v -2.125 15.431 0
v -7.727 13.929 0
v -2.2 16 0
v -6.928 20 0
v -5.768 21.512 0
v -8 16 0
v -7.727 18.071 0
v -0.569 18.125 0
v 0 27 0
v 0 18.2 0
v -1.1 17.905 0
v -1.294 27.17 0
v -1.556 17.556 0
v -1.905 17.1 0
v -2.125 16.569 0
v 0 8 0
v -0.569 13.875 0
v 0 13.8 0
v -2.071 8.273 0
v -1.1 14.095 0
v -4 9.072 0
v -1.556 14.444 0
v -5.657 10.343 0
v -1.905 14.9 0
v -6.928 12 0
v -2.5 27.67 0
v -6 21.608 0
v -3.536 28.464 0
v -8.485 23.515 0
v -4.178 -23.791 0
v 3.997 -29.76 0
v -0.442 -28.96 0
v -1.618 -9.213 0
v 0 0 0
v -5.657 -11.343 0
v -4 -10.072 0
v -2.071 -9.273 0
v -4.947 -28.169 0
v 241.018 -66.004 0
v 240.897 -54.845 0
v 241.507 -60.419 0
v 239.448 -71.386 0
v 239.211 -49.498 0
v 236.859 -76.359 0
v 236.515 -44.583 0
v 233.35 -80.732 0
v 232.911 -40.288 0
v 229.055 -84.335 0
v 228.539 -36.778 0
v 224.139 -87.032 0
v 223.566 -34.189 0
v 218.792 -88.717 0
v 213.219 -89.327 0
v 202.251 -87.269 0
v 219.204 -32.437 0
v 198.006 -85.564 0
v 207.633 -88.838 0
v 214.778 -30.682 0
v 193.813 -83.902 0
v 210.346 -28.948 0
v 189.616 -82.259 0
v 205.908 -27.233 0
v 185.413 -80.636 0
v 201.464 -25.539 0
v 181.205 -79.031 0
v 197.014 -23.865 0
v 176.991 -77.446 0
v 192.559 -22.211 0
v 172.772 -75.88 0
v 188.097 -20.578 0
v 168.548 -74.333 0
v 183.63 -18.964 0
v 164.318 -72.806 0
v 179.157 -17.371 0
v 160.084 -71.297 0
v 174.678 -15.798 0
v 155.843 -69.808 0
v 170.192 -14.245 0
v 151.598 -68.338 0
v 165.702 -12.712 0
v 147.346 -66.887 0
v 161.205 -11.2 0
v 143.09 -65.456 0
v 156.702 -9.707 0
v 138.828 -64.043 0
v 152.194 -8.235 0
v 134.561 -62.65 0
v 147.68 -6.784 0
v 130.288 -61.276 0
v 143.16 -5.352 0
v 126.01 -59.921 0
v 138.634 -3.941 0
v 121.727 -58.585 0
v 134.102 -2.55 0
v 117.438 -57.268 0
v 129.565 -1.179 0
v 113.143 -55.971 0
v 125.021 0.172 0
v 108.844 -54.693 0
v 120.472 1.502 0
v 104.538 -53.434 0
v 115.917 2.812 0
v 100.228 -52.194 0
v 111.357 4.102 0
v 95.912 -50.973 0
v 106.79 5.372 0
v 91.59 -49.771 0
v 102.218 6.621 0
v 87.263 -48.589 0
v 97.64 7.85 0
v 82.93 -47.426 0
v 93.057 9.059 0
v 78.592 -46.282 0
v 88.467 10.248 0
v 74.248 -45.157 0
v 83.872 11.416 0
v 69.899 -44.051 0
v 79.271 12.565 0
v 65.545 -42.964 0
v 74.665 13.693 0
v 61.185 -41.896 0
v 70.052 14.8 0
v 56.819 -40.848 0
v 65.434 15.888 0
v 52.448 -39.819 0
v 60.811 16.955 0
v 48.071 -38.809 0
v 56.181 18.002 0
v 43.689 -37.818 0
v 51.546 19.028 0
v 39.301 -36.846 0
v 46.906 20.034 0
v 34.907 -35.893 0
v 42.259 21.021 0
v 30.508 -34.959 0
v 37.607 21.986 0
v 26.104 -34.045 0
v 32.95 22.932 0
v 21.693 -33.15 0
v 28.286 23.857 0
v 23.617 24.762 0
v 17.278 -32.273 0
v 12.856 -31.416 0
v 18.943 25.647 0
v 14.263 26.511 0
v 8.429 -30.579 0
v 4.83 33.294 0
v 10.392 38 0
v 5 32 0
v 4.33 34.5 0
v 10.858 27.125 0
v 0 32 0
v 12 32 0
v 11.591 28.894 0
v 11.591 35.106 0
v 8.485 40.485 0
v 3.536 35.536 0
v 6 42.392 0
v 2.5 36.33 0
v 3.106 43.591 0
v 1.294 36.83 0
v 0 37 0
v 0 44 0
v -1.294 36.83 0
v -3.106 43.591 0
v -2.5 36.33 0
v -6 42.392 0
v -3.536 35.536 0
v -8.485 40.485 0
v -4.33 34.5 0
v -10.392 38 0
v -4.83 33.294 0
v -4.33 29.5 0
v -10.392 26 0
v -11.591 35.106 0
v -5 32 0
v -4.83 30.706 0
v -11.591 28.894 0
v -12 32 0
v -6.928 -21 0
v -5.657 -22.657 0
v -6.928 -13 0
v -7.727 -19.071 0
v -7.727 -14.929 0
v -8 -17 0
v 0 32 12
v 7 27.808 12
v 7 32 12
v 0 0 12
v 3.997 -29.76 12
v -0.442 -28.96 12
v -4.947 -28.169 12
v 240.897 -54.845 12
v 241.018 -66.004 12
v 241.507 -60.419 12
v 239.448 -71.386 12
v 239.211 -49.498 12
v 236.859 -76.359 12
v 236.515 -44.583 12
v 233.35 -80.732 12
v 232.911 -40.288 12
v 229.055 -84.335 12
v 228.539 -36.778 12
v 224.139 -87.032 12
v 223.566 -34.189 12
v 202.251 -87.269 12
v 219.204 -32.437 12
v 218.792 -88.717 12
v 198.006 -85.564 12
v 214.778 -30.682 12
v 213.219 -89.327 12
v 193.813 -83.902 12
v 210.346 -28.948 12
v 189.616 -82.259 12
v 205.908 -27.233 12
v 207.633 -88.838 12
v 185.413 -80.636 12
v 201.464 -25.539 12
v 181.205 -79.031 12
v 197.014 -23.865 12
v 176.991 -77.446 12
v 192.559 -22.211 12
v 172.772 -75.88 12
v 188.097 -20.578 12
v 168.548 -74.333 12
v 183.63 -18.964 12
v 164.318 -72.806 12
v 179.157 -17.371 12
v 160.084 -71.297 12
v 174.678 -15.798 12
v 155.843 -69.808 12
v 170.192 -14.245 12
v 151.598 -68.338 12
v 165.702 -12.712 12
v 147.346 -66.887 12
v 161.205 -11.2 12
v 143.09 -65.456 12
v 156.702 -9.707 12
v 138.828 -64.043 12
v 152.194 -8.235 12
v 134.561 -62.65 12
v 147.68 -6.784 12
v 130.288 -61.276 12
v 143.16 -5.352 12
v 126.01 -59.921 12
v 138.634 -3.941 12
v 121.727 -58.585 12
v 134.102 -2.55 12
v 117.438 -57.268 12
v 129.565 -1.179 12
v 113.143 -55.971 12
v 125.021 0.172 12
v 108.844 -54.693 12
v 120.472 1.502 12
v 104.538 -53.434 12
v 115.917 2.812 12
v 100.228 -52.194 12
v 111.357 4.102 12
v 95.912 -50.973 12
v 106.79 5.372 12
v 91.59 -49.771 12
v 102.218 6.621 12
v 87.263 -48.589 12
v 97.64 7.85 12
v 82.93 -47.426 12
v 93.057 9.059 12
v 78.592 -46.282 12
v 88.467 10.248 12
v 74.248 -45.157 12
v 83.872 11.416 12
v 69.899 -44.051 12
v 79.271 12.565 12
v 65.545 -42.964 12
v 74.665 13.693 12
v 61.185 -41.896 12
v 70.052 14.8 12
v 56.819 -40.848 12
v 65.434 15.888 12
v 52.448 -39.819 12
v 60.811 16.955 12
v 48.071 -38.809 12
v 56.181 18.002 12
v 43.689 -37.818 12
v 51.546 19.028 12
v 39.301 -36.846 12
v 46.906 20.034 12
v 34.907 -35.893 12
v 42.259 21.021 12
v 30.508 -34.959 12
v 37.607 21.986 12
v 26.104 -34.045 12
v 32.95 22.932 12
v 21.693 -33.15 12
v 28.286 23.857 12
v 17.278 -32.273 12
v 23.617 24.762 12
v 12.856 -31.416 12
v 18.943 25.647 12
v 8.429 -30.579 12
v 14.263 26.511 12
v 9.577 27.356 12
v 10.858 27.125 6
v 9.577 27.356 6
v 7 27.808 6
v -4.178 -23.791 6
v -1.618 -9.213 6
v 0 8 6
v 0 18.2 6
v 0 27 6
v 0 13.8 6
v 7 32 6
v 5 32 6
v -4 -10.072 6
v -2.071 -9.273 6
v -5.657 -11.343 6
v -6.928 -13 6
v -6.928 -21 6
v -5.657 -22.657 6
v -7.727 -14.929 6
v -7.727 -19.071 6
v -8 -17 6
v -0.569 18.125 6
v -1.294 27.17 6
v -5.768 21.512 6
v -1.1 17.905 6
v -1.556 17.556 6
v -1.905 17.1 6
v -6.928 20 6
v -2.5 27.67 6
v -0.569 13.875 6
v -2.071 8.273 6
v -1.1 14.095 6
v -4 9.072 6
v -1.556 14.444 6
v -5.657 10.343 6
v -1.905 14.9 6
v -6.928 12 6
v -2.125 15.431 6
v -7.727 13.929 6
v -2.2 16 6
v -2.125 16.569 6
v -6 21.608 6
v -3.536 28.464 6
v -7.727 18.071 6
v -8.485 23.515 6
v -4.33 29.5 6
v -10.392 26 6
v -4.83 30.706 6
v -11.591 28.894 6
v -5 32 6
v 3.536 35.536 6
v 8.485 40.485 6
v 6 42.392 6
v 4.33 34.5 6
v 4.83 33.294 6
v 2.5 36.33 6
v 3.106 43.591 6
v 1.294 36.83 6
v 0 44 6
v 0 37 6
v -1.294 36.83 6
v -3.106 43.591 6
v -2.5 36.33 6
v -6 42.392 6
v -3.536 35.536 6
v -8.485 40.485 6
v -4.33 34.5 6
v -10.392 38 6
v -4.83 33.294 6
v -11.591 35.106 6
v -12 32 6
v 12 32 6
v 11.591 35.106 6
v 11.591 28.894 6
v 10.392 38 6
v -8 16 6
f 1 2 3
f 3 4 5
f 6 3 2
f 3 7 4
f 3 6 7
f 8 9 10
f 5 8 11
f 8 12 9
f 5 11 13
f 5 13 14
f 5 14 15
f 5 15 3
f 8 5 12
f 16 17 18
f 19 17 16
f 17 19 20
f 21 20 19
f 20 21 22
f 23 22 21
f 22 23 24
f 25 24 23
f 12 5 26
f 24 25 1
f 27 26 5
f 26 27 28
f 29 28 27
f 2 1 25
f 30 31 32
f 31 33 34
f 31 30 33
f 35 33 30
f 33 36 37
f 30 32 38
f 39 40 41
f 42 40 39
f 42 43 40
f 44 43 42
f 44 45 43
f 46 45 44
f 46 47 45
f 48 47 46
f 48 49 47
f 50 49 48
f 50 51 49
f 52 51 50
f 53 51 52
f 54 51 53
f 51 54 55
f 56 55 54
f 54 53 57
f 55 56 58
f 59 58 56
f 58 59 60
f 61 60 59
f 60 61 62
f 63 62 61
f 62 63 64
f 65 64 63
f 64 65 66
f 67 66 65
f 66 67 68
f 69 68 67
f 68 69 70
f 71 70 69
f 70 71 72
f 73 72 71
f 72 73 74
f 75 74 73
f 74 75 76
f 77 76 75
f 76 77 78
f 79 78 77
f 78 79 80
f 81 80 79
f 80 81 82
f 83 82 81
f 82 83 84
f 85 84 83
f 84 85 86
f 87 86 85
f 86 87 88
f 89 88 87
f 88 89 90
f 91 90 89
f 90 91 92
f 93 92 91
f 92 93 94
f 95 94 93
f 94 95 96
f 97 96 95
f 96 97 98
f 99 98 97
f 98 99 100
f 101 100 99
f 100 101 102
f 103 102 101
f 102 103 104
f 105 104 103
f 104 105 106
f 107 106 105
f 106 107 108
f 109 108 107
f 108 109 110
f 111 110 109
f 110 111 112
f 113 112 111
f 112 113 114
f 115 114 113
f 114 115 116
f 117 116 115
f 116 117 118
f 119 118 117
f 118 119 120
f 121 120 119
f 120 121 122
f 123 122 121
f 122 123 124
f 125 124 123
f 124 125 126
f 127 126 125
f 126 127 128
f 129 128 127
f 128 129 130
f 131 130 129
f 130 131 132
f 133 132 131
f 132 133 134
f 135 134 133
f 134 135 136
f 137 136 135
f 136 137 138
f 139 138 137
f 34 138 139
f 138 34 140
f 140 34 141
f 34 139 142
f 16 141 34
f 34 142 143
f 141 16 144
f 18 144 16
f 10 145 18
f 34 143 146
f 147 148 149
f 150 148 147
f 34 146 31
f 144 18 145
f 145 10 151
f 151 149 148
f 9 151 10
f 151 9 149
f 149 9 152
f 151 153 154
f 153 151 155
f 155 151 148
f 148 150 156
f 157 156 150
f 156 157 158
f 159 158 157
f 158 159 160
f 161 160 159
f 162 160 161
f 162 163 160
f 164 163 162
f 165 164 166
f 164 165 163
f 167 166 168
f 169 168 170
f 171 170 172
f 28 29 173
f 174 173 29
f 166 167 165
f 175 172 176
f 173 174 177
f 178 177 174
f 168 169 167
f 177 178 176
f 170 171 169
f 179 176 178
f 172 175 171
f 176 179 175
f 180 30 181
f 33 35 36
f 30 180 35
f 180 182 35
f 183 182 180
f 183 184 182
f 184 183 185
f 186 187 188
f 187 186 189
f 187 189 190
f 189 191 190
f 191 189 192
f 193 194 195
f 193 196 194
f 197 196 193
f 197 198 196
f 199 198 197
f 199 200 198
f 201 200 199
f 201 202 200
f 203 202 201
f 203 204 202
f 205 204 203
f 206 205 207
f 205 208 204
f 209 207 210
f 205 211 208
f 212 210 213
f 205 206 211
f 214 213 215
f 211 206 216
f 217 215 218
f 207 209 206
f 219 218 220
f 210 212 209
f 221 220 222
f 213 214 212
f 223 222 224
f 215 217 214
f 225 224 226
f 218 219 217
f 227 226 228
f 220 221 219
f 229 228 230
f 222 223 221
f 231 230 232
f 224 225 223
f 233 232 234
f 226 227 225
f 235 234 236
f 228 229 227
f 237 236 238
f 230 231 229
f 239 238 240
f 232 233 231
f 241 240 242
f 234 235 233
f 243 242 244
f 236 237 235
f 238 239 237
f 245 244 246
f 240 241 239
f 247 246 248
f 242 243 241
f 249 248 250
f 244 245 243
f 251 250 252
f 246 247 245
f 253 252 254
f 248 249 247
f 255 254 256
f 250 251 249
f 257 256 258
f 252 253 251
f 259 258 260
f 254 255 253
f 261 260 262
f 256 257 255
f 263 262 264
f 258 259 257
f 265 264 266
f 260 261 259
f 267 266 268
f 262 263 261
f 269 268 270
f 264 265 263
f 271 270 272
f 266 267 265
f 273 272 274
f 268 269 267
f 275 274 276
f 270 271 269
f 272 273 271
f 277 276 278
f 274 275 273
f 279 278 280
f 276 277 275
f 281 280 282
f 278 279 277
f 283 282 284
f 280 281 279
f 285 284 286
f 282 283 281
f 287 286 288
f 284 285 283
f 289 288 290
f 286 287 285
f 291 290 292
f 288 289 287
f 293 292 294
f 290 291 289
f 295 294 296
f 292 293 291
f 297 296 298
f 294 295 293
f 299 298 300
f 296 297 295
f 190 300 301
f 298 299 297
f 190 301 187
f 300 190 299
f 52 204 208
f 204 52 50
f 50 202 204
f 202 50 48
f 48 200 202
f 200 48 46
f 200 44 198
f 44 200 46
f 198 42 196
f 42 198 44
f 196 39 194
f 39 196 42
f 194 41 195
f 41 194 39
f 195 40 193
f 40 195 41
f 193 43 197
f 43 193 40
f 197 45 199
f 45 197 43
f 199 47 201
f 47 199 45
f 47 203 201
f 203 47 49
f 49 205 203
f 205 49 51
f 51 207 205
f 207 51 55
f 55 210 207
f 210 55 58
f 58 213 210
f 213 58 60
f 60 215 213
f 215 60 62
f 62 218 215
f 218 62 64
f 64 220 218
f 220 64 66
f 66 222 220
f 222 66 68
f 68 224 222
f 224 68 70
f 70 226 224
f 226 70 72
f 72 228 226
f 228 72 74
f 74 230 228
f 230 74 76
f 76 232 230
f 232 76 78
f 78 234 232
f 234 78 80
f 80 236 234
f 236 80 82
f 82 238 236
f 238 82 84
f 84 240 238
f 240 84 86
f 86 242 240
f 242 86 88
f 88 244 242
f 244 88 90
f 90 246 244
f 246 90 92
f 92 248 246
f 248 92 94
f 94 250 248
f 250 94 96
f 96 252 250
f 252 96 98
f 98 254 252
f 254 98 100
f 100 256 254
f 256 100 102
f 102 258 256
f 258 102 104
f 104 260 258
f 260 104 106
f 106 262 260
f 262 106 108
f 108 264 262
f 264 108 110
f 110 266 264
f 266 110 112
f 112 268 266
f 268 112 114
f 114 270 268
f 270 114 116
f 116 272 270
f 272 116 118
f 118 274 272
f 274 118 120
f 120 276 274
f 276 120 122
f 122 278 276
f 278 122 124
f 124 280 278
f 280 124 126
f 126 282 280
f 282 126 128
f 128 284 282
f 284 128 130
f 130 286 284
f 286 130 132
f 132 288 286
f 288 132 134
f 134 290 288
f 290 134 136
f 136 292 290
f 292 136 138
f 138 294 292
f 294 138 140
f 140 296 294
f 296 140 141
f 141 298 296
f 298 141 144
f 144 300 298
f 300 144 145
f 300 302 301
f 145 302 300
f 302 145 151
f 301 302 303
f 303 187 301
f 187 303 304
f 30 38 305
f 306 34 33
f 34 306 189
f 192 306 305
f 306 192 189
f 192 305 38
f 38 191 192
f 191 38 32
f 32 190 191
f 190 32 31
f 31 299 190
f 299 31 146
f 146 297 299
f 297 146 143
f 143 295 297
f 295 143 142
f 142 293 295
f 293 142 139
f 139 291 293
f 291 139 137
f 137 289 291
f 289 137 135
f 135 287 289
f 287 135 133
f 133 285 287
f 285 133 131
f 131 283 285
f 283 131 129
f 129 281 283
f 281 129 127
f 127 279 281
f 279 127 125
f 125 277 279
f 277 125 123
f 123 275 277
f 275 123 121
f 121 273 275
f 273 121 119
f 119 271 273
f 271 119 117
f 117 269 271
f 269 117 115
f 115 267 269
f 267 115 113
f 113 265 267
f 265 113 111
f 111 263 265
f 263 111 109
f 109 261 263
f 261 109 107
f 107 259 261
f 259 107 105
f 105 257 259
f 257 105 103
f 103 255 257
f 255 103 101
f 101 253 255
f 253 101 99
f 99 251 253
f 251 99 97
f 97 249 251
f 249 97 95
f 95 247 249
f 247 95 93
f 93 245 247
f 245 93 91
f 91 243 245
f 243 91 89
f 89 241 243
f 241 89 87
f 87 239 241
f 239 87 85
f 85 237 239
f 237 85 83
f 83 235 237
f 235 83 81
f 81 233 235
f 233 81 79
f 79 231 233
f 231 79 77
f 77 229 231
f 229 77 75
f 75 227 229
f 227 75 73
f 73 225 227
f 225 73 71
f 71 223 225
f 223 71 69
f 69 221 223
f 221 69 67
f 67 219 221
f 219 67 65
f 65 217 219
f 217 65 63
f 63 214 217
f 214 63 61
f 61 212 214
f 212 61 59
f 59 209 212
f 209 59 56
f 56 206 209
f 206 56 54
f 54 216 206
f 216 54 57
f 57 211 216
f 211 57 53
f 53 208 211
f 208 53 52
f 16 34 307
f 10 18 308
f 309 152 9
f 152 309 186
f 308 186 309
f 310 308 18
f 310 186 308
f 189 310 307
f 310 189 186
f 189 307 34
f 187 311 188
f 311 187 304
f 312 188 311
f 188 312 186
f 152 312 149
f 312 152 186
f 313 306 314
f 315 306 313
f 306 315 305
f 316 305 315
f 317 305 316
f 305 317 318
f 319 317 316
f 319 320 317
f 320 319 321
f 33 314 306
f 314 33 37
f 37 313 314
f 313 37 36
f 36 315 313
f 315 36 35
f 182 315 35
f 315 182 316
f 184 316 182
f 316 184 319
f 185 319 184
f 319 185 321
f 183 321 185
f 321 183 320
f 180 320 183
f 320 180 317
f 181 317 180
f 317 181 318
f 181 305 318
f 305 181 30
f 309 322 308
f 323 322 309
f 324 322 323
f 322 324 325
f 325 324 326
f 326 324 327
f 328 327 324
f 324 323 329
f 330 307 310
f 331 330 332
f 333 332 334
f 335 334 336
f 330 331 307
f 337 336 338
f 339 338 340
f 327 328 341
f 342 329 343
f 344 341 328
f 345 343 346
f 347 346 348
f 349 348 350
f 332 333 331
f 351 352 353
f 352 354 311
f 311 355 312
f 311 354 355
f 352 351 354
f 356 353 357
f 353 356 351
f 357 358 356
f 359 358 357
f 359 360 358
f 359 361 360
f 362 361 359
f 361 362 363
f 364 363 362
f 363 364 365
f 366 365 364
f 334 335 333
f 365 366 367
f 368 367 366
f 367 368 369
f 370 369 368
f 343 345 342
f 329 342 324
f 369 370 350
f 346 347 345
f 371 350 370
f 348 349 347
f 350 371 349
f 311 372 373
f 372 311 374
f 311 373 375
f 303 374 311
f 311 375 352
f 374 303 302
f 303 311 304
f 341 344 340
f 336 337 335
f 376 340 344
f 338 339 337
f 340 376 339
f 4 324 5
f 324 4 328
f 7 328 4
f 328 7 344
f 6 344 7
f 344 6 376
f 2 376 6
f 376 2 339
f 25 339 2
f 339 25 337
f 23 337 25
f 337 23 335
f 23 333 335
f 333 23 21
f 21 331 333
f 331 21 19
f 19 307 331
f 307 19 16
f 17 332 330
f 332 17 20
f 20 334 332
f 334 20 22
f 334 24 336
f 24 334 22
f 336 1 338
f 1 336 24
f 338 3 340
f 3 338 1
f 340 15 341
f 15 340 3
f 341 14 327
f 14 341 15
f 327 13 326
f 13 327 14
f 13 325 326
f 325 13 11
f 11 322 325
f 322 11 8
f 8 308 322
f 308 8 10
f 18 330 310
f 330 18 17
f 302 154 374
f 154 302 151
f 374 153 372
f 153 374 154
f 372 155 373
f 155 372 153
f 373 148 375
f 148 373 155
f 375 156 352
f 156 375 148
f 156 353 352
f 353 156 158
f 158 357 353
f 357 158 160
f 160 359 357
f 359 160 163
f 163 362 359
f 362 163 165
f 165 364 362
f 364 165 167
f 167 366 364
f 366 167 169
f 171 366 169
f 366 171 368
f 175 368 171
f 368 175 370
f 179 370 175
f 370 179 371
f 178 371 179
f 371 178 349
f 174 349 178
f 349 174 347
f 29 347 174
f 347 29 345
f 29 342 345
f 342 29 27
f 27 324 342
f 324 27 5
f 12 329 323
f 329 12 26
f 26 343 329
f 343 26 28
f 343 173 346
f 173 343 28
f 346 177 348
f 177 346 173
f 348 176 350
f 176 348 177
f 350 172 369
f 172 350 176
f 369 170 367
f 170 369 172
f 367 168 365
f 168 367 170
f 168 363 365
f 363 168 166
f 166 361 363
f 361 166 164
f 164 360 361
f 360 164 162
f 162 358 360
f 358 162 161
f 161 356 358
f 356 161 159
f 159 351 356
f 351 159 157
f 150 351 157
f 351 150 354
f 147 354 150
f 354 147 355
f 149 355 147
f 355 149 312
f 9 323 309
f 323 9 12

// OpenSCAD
// hanger-split: half w25 w=25 cm slope=15.92 deg bow=0.59 cm r=2.86 cm depth=12.0 mm
// Print this half twice, flat. Turn the second half 180 degrees about the vertical axis, lay the
// bosses together and clamp with two M4 bolts through the 4.4 mm holes.
// Generated by hanger_split.split.scad; not rendered in this run (no OpenSCAD in the image).
depth = 12.0;
union() {
  linear_extrude(height = 12) polygon([[4.947, 28.169], [9.577, 27.356], [14.263, 26.511], [18.943, 25.647], [23.617, 24.762], [28.286, 23.857], [32.950, 22.932], [37.607, 21.986], [42.259, 21.021], [46.906, 20.034], [51.546, 19.028], [56.181, 18.002], [60.811, 16.955], [65.434, 15.888], [70.052, 14.800], [74.665, 13.693], [79.271, 12.565], [83.872, 11.416], [88.467, 10.248], [93.057, 9.059], [97.640, 7.850], [102.218, 6.621], [106.790, 5.372], [111.357, 4.102], [115.917, 2.812], [120.472, 1.502], [125.021, 0.172], [129.565, -1.179], [134.102, -2.550], [138.634, -3.941], [143.160, -5.352], [147.680, -6.784], [152.194, -8.235], [156.702, -9.707], [161.205, -11.200], [165.702, -12.712], [170.192, -14.245], [174.678, -15.798], [179.157, -17.371], [183.630, -18.964], [188.097, -20.578], [192.559, -22.211], [197.014, -23.865], [201.464, -25.539], [205.908, -27.233], [210.346, -28.948], [214.778, -30.682], [219.204, -32.437], [223.566, -34.189], [228.539, -36.778], [232.911, -40.288], [236.515, -44.583], [239.211, -49.498], [240.897, -54.845], [241.507, -60.419], [241.018, -66.004], [239.448, -71.386], [236.859, -76.359], [233.350, -80.732], [229.055, -84.335], [224.139, -87.032], [218.792, -88.717], [213.219, -89.327], [207.633, -88.838], [202.251, -87.269], [198.006, -85.564], [193.813, -83.902], [189.616, -82.259], [185.413, -80.636], [181.205, -79.031], [176.991, -77.446], [172.772, -75.880], [168.548, -74.333], [164.318, -72.806], [160.084, -71.297], [155.843, -69.808], [151.598, -68.338], [147.346, -66.887], [143.090, -65.456], [138.828, -64.043], [134.561, -62.650], [130.288, -61.276], [126.010, -59.921], [121.727, -58.585], [117.438, -57.268], [113.143, -55.971], [108.844, -54.693], [104.538, -53.434], [100.228, -52.194], [95.912, -50.973], [91.590, -49.771], [87.263, -48.589], [82.930, -47.426], [78.592, -46.282], [74.248, -45.157], [69.899, -44.051], [65.545, -42.964], [61.185, -41.896], [56.819, -40.848], [52.448, -39.819], [48.071, -38.809], [43.689, -37.818], [39.301, -36.846], [34.907, -35.893], [30.508, -34.959], [26.104, -34.045], [21.693, -33.150], [17.278, -32.273], [12.856, -31.416], [8.429, -30.579], [3.997, -29.760], [-0.442, -28.960], [-4.947, -28.169]]);
  linear_extrude(height = 12) polygon([[0.000, -28.600], [7.402, -27.625], [14.300, -24.768], [20.223, -20.223], [24.768, -14.300], [27.625, -7.402], [28.600, -0.000], [27.625, 7.402], [24.768, 14.300], [20.223, 20.223], [14.300, 24.768], [7.402, 27.625], [0.000, 28.600]]);
  linear_extrude(height = 12) polygon([[0.000, 0.000], [7.000, 0.000], [7.000, 32.000], [0.000, 32.000]]);
  linear_extrude(height = 6) difference() { polygon([[8.000, -17.000], [7.727, -14.929], [6.928, -13.000], [5.657, -11.343], [4.000, -10.072], [2.071, -9.273], [0.000, -9.000], [-2.071, -9.273], [-4.000, -10.072], [-5.657, -11.343], [-6.928, -13.000], [-7.727, -14.929], [-8.000, -17.000], [-7.727, -19.071], [-6.928, -21.000], [-5.657, -22.657], [-4.000, -23.928], [-2.071, -24.727], [-0.000, -25.000], [2.071, -24.727], [4.000, -23.928], [5.657, -22.657], [6.928, -21.000], [7.727, -19.071]]); polygon([[2.200, -17.000], [2.125, -16.431], [1.905, -15.900], [1.556, -15.444], [1.100, -15.095], [0.569, -14.875], [0.000, -14.800], [-0.569, -14.875], [-1.100, -15.095], [-1.556, -15.444], [-1.905, -15.900], [-2.125, -16.431], [-2.200, -17.000], [-2.125, -17.569], [-1.905, -18.100], [-1.556, -18.556], [-1.100, -18.905], [-0.569, -19.125], [-0.000, -19.200], [0.569, -19.125], [1.100, -18.905], [1.556, -18.556], [1.905, -18.100], [2.125, -17.569]]); }
  linear_extrude(height = 6) difference() { polygon([[8.000, 16.000], [7.727, 18.071], [6.928, 20.000], [5.657, 21.657], [4.000, 22.928], [2.071, 23.727], [0.000, 24.000], [-2.071, 23.727], [-4.000, 22.928], [-5.657, 21.657], [-6.928, 20.000], [-7.727, 18.071], [-8.000, 16.000], [-7.727, 13.929], [-6.928, 12.000], [-5.657, 10.343], [-4.000, 9.072], [-2.071, 8.273], [-0.000, 8.000], [2.071, 8.273], [4.000, 9.072], [5.657, 10.343], [6.928, 12.000], [7.727, 13.929]]); polygon([[2.200, 16.000], [2.125, 16.569], [1.905, 17.100], [1.556, 17.556], [1.100, 17.905], [0.569, 18.125], [0.000, 18.200], [-0.569, 18.125], [-1.100, 17.905], [-1.556, 17.556], [-1.905, 17.100], [-2.125, 16.569], [-2.200, 16.000], [-2.125, 15.431], [-1.905, 14.900], [-1.556, 14.444], [-1.100, 14.095], [-0.569, 13.875], [-0.000, 13.800], [0.569, 13.875], [1.100, 14.095], [1.556, 14.444], [1.905, 14.900], [2.125, 15.431]]); }
  linear_extrude(height = 6) difference() { polygon([[12.000, 32.000], [11.591, 35.106], [10.392, 38.000], [8.485, 40.485], [6.000, 42.392], [3.106, 43.591], [0.000, 44.000], [-3.106, 43.591], [-6.000, 42.392], [-8.485, 40.485], [-10.392, 38.000], [-11.591, 35.106], [-12.000, 32.000], [-11.591, 28.894], [-10.392, 26.000], [-8.485, 23.515], [-6.000, 21.608], [-3.106, 20.409], [-0.000, 20.000], [3.106, 20.409], [6.000, 21.608], [8.485, 23.515], [10.392, 26.000], [11.591, 28.894]]); polygon([[5.000, 32.000], [4.830, 33.294], [4.330, 34.500], [3.536, 35.536], [2.500, 36.330], [1.294, 36.830], [0.000, 37.000], [-1.294, 36.830], [-2.500, 36.330], [-3.536, 35.536], [-4.330, 34.500], [-4.830, 33.294], [-5.000, 32.000], [-4.830, 30.706], [-4.330, 29.500], [-3.536, 28.464], [-2.500, 27.670], [-1.294, 27.170], [-0.000, 27.000], [1.294, 27.170], [2.500, 27.670], [3.536, 28.464], [4.330, 29.500], [4.830, 30.706]]); }
}
